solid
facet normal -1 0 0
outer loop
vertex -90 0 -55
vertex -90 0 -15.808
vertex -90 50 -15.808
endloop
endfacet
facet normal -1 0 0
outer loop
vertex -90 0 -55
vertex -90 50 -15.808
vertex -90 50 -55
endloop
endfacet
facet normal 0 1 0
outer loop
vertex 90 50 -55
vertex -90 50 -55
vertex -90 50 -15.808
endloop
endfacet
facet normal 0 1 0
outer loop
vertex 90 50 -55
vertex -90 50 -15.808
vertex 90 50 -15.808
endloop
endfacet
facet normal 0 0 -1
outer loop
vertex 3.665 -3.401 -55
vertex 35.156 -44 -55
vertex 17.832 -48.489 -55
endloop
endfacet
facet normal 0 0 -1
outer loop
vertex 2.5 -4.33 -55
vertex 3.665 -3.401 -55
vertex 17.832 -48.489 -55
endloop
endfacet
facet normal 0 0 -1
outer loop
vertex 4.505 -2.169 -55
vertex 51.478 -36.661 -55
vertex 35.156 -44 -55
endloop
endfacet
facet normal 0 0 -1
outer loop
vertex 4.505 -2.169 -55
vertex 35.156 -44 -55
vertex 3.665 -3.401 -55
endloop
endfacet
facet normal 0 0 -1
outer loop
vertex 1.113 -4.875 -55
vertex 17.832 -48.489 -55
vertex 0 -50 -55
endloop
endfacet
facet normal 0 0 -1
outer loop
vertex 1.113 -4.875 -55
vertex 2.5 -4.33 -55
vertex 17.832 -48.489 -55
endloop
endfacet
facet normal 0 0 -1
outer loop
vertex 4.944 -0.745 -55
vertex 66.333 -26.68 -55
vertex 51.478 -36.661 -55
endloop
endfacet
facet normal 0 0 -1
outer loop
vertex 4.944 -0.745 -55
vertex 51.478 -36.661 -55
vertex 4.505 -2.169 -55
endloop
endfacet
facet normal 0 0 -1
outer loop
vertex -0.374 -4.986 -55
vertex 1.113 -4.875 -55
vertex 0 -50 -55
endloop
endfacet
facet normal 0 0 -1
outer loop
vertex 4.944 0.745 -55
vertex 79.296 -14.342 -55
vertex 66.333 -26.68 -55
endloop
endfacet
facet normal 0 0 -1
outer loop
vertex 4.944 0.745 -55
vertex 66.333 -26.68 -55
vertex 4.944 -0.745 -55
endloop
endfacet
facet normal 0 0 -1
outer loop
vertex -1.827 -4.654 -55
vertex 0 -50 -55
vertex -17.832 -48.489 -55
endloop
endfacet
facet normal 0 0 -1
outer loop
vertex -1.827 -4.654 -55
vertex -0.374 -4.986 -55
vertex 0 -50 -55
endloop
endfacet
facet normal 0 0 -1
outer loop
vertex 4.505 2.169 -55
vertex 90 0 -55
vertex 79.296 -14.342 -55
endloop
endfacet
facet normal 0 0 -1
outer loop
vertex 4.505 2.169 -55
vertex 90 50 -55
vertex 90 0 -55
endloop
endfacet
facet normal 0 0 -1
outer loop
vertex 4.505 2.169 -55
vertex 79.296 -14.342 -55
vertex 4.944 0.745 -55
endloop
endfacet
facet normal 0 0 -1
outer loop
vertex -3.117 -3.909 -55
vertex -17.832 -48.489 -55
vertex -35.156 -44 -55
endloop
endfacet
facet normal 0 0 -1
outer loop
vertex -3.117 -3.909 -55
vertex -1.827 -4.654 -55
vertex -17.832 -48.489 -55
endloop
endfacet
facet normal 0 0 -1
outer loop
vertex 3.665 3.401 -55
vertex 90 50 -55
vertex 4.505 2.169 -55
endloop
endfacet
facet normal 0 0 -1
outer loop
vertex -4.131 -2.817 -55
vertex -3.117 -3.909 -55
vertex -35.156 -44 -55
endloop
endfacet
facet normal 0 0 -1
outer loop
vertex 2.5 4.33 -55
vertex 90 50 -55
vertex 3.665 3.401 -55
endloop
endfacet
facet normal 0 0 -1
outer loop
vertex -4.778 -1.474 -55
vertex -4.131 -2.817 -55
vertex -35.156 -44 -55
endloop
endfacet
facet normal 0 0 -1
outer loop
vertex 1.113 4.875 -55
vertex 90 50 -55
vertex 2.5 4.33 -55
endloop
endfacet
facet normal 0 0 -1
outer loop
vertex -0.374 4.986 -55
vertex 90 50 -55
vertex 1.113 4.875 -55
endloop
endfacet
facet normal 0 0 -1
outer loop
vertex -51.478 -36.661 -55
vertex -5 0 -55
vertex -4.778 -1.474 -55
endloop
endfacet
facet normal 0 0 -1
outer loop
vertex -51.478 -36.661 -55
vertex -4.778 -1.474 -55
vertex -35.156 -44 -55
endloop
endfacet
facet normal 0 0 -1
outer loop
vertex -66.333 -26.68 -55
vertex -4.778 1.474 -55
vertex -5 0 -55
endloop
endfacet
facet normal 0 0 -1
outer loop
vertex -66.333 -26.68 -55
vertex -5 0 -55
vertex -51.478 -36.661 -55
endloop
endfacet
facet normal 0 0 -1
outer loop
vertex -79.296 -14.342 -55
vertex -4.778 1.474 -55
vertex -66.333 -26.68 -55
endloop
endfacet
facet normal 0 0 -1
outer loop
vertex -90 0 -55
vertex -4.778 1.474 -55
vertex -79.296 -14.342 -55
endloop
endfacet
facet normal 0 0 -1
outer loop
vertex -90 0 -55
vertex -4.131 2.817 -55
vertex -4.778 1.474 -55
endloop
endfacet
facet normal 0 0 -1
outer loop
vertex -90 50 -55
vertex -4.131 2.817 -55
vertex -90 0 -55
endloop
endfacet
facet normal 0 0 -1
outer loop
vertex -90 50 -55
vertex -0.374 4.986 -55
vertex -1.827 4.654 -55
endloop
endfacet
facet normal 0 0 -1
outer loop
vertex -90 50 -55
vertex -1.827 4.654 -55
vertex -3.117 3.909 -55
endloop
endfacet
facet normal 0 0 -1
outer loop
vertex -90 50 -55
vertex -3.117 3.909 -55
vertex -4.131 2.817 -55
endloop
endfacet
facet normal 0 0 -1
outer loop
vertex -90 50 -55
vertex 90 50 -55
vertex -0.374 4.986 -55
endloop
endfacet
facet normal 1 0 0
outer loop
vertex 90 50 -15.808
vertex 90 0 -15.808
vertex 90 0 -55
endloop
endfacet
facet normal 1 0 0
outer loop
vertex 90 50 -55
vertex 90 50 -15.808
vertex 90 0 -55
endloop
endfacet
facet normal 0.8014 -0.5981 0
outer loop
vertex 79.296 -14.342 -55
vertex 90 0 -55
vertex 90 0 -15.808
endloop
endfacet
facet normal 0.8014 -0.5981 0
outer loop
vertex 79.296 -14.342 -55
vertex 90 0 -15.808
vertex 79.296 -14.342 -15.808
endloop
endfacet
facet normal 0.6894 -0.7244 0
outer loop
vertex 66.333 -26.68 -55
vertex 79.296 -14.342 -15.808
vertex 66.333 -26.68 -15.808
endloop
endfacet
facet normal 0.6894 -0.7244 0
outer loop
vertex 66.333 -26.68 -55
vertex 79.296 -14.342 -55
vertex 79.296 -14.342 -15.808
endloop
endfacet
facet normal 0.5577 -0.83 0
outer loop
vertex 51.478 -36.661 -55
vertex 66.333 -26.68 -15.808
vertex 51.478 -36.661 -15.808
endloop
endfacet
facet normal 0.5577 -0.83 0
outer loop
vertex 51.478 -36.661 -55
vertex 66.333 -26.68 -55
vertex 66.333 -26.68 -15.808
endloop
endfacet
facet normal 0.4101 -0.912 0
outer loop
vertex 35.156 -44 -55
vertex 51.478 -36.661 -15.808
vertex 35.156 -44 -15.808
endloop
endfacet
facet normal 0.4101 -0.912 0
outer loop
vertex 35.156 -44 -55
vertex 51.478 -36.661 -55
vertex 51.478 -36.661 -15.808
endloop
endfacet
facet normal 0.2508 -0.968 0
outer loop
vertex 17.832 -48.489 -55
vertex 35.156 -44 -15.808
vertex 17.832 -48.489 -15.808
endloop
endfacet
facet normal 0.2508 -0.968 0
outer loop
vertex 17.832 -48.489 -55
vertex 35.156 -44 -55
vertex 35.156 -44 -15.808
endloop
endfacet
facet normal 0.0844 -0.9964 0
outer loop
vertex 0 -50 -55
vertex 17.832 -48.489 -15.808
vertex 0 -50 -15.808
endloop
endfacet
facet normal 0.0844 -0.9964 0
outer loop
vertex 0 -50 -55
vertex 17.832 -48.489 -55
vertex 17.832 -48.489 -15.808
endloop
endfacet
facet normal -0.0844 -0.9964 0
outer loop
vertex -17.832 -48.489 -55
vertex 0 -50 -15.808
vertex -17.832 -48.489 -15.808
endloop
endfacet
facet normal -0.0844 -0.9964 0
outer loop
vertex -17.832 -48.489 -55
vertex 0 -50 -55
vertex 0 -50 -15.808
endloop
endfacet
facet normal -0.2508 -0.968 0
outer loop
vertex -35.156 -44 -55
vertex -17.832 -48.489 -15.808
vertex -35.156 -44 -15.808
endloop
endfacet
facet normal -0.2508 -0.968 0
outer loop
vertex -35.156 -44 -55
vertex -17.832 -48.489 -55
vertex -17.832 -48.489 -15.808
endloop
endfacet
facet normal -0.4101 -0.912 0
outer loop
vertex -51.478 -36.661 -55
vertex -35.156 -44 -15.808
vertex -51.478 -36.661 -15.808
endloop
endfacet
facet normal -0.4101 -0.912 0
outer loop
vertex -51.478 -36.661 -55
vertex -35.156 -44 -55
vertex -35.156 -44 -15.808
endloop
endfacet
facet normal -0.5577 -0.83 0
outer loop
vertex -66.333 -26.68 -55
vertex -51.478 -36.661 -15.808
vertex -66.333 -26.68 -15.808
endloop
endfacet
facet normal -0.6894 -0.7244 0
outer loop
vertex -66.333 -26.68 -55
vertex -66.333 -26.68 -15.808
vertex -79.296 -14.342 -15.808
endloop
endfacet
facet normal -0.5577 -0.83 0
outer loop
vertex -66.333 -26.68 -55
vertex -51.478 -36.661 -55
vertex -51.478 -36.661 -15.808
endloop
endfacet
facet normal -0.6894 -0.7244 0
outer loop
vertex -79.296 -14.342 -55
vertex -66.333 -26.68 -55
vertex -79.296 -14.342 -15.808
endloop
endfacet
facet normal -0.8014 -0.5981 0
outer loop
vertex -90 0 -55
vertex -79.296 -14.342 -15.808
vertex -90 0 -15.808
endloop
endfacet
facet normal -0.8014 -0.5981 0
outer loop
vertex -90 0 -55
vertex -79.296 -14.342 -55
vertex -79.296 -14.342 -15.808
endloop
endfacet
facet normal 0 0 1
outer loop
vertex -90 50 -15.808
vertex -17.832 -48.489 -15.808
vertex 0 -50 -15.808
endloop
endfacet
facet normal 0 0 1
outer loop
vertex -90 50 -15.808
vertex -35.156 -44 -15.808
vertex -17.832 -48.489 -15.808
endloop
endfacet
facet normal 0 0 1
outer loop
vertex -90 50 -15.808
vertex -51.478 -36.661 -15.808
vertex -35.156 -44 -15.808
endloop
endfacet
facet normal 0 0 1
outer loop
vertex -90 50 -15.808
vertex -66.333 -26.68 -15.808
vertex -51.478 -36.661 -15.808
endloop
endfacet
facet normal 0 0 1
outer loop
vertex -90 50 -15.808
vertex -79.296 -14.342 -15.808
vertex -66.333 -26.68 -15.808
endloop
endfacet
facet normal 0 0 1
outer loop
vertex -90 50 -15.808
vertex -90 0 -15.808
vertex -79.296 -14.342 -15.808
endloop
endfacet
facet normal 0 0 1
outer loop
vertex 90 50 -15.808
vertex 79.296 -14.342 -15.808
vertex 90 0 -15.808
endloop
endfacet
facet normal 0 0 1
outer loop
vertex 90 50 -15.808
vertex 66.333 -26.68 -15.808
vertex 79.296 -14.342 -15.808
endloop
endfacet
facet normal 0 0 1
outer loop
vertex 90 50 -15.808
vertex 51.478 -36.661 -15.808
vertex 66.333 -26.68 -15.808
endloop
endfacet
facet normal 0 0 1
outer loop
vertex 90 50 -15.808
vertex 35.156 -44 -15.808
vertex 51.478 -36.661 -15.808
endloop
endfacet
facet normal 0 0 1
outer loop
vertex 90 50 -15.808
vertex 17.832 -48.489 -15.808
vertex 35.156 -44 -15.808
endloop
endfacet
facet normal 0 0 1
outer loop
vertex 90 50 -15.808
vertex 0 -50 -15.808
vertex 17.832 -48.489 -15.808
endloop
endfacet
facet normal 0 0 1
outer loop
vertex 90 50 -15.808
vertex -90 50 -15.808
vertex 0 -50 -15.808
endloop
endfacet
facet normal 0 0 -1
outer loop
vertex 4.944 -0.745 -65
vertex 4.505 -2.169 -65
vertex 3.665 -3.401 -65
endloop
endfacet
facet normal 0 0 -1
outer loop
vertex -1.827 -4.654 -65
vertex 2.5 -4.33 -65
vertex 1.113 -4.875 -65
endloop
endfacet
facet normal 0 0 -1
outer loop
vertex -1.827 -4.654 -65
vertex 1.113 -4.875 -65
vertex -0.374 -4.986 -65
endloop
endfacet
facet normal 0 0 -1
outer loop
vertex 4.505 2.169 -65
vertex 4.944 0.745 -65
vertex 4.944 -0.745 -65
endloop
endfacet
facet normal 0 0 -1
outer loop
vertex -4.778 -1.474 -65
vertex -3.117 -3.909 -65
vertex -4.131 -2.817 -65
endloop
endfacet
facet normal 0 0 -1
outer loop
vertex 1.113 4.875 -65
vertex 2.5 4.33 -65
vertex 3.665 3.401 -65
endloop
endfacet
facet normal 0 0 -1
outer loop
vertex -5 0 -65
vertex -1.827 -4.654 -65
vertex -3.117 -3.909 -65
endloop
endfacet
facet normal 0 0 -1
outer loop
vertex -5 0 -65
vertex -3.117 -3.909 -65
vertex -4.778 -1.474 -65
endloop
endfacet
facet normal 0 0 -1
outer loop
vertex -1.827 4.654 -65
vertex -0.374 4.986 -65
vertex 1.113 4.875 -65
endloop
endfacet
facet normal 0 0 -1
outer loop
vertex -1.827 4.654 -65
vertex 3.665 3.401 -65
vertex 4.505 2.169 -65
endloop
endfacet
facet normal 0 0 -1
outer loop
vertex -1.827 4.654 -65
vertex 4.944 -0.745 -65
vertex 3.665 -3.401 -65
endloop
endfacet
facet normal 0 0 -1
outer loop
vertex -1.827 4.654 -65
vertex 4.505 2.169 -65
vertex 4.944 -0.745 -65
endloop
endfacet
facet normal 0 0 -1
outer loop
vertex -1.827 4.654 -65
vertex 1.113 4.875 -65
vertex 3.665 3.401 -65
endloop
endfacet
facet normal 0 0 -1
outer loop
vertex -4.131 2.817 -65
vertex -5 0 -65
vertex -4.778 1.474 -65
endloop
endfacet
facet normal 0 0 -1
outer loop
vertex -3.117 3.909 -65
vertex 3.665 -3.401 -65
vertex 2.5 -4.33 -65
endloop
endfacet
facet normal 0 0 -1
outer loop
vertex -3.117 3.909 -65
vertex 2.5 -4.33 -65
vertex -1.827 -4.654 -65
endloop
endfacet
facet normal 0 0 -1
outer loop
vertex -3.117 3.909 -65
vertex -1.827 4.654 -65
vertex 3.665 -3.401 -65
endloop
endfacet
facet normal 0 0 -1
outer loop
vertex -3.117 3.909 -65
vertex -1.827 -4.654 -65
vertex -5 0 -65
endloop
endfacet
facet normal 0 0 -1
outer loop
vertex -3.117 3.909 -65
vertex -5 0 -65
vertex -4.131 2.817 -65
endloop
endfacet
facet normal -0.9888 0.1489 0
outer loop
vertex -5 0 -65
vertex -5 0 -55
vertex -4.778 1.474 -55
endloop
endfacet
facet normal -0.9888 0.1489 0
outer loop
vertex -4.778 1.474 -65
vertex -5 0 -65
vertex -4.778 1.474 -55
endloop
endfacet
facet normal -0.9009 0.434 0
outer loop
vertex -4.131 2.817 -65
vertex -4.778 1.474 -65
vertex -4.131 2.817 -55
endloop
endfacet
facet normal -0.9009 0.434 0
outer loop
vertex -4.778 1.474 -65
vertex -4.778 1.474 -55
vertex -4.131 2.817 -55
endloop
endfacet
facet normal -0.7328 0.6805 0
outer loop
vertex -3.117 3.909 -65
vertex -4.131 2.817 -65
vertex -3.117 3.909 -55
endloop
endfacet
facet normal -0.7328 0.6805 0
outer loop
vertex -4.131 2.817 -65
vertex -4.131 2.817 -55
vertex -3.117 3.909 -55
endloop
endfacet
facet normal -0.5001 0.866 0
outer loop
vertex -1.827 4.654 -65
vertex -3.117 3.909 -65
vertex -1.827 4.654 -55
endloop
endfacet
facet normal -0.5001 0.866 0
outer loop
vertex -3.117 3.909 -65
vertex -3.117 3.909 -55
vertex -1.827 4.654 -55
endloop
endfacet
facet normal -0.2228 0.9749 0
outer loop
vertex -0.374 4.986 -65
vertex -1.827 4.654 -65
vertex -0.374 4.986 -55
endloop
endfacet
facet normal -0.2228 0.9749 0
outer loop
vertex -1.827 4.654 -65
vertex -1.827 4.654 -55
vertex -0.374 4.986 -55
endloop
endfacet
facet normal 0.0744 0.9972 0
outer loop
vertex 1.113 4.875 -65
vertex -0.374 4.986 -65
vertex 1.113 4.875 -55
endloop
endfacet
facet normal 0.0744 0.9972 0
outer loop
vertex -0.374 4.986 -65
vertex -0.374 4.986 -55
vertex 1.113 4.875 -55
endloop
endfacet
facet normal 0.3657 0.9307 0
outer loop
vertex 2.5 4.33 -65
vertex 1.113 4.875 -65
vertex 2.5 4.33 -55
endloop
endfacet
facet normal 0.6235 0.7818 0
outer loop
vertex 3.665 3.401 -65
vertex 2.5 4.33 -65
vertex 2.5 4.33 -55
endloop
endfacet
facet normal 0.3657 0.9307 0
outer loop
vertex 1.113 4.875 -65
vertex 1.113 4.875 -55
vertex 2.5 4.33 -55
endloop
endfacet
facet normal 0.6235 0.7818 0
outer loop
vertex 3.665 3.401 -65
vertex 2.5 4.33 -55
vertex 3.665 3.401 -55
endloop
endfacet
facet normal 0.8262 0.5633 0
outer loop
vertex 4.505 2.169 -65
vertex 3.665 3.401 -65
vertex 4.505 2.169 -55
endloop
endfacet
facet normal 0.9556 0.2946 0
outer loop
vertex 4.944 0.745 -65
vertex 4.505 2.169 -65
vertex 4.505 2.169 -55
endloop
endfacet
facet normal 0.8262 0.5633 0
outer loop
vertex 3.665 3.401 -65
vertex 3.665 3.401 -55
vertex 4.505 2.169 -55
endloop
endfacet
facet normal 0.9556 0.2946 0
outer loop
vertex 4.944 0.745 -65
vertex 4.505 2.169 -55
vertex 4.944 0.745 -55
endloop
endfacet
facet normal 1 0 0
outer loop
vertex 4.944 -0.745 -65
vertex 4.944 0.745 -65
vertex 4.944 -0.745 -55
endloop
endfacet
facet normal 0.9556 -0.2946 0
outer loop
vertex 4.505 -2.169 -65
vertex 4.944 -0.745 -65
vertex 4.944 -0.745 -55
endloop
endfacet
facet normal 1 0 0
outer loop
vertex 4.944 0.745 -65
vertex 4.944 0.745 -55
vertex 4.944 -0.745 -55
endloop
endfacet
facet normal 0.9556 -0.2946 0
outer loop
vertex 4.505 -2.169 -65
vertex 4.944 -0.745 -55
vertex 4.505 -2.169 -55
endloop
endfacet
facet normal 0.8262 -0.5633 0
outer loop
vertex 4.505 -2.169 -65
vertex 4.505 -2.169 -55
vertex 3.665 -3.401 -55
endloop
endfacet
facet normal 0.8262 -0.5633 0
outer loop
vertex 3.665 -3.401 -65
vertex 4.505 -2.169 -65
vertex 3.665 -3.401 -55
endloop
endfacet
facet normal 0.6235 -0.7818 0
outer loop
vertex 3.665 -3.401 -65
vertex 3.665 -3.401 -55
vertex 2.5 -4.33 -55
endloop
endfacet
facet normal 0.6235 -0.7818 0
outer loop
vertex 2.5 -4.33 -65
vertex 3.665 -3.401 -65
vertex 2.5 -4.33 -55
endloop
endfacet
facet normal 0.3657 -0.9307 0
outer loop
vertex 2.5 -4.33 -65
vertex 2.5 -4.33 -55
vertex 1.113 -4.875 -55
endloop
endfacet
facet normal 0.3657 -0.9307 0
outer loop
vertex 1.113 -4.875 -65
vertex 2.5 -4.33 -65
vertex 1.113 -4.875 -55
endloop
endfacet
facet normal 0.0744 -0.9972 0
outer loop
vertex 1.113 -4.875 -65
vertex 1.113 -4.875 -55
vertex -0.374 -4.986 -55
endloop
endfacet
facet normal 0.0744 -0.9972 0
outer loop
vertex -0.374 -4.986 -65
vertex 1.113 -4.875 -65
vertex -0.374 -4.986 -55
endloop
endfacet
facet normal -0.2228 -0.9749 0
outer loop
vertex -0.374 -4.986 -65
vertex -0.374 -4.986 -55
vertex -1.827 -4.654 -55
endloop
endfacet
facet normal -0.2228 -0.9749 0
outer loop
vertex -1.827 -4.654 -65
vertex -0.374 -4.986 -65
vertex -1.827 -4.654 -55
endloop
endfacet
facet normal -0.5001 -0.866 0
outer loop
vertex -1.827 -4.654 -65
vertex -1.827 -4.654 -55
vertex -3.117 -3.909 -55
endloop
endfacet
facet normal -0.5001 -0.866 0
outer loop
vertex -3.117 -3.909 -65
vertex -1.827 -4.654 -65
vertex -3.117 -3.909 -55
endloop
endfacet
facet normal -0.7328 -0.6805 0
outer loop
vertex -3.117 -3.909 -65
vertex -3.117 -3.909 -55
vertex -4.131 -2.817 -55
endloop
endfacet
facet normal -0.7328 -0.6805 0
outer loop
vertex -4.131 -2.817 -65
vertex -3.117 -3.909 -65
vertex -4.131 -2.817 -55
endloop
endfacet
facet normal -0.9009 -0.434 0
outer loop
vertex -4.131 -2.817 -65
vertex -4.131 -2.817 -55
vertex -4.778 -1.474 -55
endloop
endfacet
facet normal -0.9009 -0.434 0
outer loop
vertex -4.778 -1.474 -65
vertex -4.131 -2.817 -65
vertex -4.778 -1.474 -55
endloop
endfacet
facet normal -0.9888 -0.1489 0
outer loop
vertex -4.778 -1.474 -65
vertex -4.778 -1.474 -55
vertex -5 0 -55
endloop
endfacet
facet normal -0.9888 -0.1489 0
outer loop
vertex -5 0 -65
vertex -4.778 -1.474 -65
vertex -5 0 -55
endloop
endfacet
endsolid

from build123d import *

# Parameters (mm, degrees)
SKETCH1_W                = 180
SKETCH1_H                = 110
BOSS_EXTRUDE1_DEPTH      = 50
BOSS_EXTRUDE2_DEPTH      = 110
CUT_EXTRUDE1_DEPTH       = 146.344418537
BOSS_EXTRUDE5_DEPTH      = 10
BOSS_EXTRUDE5_DEPTH_BACK = 10
SKETCH5_R                = 5
SKETCH6_W                = 218.788065493
SKETCH6_H                = 71.8794134
CUT_EXTRUDE2_DEPTH       = 126


with BuildPart() as part:
    # Sketch1 → Boss-Extrude1 (new body)
    with BuildSketch(Plane(origin=(0, 0, 0), x_dir=(1, 0, 0), z_dir=(0, 1, 0))):
        Rectangle(SKETCH1_W, SKETCH1_H)
    extrude(amount=BOSS_EXTRUDE1_DEPTH)

    # Sketch2 → Boss-Extrude2 (add)
    with BuildSketch(Plane(origin=(-35, 0, -55), x_dir=(1, 0, 0), z_dir=(0, 0, 1))):
        with BuildLine():
            Line((-55, 0), (125, 0))
            ThreePointArc((125, 0), (35, -50), (-55, 0))
        make_face()
    extrude(amount=BOSS_EXTRUDE2_DEPTH)

    # Sketch3 → Cut-Extrude1 (cut, through all)
    with BuildSketch(Plane(origin=(0, 50, 0), x_dir=(1, 0, 0), z_dir=(0, 1, 0))):
        Polygon((-49.118803686, -55), (-90, 15.808309091), (-90, -55), align=None)
    cut_extrude1 = extrude(amount=-CUT_EXTRUDE1_DEPTH, mode=Mode.SUBTRACT)

    # Mirror1: Cut-Extrude1 across plane
    add(cut_extrude1.mirror(Plane(origin=(0, 0, 0), x_dir=(0, 0, 1), z_dir=(1, 0, 0))), mode=Mode.SUBTRACT)

    # Sketch5 → Boss-Extrude5 (add, two sides: drawn at the far end of the back side and taken through both)
    with BuildSketch(Plane(origin=(0, 0, -55), x_dir=(-1, 0, 0), z_dir=(0, 0, -1)).offset(-BOSS_EXTRUDE5_DEPTH_BACK)):
        Circle(SKETCH5_R)
    extrude(amount=BOSS_EXTRUDE5_DEPTH + BOSS_EXTRUDE5_DEPTH_BACK)

    # Sketch4 → Revolve1 (revolve)
    with BuildSketch(Plane(origin=(-60.654801368, 0, 35.019065898), x_dir=(0.49999999999999495, 0, 0.8660254037844417), z_dir=(-0.8660254037844417, 0, 0.49999999999999495))):
        with BuildLine():
            ThreePointArc((-20.965161058, 42.942576489), (4.034838942, 17.942576489), (-20.965161058, -7.057423511))
            Line((-20.965161058, -7.057423511), (-20.965161058, 42.942576489))
        make_face()
    revolve1 = revolve(axis=Axis((-71.137381897, 42.942576489, 16.862703827), (0, -1, 0)))

    # Mirror2: Revolve1 across plane
    add(revolve1.mirror(Plane(origin=(0, 0, 0), x_dir=(0, 0, 1), z_dir=(1, 0, 0))))

    # Sketch6 → Cut-Extrude2 (cut)
    with BuildSketch(Plane(origin=(0, 50, 0), x_dir=(1, 0, 0), z_dir=(0, 1, 0))):
        with Locations((-0.333721882, -20.131397609)):
            Rectangle(SKETCH6_W, SKETCH6_H)
    extrude(amount=-CUT_EXTRUDE2_DEPTH, mode=Mode.SUBTRACT)


solid = part.part
